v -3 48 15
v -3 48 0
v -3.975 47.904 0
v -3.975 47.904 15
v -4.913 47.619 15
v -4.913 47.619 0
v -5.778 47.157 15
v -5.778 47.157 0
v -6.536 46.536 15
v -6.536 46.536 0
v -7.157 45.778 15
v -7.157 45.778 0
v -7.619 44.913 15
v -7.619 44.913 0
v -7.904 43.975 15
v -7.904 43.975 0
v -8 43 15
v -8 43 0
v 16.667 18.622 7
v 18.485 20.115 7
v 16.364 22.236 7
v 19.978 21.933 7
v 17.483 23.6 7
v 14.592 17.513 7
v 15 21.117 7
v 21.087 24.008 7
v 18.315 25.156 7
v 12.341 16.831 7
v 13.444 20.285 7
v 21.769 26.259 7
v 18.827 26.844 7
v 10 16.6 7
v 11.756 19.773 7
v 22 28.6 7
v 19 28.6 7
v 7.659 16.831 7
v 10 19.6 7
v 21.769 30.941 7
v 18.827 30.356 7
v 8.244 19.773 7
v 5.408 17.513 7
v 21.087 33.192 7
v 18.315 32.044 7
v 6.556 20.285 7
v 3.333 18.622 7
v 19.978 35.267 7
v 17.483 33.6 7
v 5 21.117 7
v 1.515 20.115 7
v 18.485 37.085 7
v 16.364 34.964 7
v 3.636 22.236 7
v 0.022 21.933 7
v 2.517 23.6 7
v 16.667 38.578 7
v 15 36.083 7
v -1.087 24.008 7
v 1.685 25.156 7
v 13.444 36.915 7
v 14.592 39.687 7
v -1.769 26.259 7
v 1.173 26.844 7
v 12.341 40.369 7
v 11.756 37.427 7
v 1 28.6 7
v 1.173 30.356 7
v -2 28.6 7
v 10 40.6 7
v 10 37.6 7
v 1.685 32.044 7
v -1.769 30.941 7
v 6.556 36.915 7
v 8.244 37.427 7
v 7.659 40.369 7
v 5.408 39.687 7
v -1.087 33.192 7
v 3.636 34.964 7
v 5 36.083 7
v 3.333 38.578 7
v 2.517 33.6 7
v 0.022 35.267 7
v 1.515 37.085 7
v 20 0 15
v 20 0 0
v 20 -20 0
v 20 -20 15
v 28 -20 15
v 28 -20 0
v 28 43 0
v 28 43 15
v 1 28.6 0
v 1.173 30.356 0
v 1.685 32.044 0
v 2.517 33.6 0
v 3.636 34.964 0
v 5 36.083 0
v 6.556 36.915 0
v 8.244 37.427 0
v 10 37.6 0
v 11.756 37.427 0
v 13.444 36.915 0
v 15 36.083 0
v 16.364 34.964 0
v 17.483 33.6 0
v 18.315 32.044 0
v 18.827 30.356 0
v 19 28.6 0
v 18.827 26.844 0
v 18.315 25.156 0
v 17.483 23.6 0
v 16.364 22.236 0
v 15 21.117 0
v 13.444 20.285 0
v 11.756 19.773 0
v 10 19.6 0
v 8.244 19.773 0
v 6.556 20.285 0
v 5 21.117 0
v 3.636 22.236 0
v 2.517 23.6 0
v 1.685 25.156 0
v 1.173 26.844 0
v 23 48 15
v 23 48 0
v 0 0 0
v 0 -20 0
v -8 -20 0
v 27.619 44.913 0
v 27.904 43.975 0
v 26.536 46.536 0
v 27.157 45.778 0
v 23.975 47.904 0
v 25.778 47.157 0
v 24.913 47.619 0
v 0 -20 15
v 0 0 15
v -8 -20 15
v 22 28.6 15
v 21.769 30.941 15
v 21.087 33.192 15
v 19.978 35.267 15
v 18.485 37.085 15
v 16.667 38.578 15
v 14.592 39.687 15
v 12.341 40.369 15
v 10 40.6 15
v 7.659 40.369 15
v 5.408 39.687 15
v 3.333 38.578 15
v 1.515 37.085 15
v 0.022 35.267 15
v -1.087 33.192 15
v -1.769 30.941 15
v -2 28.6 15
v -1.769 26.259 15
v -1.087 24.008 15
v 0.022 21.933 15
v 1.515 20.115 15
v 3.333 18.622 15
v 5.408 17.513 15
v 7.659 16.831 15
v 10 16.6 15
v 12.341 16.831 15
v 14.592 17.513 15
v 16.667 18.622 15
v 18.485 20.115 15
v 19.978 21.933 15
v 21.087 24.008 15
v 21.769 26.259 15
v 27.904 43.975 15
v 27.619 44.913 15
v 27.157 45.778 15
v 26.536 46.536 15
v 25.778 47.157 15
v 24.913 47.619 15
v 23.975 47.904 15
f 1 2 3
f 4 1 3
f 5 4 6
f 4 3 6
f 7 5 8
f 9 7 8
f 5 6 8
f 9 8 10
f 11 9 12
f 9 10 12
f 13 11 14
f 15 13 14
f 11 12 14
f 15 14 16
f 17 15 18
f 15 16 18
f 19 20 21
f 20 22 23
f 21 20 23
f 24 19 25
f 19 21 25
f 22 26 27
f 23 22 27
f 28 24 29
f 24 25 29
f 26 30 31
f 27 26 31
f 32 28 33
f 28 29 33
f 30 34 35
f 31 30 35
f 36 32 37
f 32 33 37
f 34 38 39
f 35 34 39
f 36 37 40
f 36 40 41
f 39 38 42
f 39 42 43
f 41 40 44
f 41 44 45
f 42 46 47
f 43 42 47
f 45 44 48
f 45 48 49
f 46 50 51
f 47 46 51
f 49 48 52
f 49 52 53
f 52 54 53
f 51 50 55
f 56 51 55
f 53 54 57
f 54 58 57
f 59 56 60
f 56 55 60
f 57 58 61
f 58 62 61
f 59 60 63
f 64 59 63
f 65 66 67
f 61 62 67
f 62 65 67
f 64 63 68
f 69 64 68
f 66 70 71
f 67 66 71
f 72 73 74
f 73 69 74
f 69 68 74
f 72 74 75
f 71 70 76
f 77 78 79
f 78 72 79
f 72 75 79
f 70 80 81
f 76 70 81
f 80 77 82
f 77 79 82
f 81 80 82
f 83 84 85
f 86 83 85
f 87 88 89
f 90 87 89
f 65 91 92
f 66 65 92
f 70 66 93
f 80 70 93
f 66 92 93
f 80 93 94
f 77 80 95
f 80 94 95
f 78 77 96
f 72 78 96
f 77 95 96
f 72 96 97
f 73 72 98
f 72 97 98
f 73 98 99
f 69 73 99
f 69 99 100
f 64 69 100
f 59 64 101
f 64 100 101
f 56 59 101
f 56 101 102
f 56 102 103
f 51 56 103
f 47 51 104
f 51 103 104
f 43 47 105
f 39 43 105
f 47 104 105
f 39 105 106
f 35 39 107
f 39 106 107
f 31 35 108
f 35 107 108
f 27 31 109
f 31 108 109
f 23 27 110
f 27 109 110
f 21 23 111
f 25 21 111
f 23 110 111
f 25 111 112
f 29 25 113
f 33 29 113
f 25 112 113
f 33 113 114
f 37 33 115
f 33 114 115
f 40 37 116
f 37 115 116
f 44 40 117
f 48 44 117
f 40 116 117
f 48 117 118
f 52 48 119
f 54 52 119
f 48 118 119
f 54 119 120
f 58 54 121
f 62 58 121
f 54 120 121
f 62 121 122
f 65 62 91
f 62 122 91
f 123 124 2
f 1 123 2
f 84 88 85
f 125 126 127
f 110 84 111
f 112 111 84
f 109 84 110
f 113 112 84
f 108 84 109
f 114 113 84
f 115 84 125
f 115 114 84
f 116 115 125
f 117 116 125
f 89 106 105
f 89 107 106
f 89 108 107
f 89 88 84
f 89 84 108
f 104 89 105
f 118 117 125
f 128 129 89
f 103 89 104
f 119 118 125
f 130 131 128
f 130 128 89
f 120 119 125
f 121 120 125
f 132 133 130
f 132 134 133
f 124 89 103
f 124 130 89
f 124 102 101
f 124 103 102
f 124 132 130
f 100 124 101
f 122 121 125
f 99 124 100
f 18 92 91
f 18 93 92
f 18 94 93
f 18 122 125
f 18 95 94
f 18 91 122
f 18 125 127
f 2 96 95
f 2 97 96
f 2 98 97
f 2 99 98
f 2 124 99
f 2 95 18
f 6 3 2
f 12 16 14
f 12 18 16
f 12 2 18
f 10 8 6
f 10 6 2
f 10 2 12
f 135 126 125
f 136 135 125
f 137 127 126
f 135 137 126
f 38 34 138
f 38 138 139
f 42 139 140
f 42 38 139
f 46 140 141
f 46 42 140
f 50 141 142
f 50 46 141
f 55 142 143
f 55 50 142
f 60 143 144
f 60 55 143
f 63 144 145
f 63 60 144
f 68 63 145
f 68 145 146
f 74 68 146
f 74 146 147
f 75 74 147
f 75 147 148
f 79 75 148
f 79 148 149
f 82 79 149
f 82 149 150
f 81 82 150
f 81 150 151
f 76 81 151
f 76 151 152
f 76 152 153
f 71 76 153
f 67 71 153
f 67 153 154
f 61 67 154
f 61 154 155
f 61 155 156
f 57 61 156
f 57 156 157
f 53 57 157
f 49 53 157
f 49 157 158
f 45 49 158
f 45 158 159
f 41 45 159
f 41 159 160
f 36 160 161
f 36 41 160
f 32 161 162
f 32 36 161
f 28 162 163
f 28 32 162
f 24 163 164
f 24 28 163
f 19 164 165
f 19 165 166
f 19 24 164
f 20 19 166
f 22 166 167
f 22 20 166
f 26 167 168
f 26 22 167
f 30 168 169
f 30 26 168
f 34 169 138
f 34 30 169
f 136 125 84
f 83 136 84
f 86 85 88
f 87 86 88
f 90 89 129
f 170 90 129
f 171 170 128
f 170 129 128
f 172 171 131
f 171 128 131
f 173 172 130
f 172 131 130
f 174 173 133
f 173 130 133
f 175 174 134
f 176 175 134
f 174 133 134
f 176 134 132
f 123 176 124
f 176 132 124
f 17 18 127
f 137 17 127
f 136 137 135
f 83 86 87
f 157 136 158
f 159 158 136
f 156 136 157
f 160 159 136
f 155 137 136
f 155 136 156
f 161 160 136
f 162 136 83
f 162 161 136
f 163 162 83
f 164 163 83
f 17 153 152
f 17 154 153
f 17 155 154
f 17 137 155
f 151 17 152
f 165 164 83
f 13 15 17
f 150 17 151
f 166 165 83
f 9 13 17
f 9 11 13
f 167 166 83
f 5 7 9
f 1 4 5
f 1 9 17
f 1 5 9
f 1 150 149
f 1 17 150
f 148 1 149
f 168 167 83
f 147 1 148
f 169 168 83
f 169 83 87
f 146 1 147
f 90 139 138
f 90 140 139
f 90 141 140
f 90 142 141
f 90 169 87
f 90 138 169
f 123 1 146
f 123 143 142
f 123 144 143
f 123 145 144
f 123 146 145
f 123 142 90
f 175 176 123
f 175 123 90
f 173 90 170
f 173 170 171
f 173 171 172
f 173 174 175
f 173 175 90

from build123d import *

# Parameters (mm, degrees)
CROQUIS1_R              = 12
SALIENTE_EXTRUIR1_DEPTH = 15
CROQUIS3_R              = 12
CROQUIS3_R_2            = 9
SALIENTE_EXTRUIR2_DEPTH = 7


with BuildPart() as part:
    # Croquis1 → Saliente-Extruir1 (new body)
    with BuildSketch(Plane.XY):
        with BuildLine():
            Line((0, -20), (0, 0))
            Line((0, 0), (20, 0))
            Line((20, 0), (20, -20))
            Line((20, -20), (28, -20))
            Line((28, -20), (28, 43))
            ThreePointArc((28, 43), (26.535533906, 46.535533906), (23, 48))
            Line((23, 48), (-3, 48))
            ThreePointArc((-3, 48), (-6.535533906, 46.535533906), (-8, 43))
            Line((-8, 43), (-8, -20))
            Line((-8, -20), (0, -20))
        make_face()
        with Locations((10, 28.6)):
            Circle(CROQUIS1_R, mode=Mode.SUBTRACT)
    extrude(amount=SALIENTE_EXTRUIR1_DEPTH)

    # Croquis3 → Saliente-Extruir2 (add)
    with BuildSketch(Plane(origin=(0, 0, 0), x_dir=(-1, 0, 0), z_dir=(0, 0, -1))):
        with Locations((-10, 28.6)):
            Circle(CROQUIS3_R)
        with Locations((-10, 28.6)):
            Circle(CROQUIS3_R_2, mode=Mode.SUBTRACT)
    extrude(amount=-SALIENTE_EXTRUIR2_DEPTH)


solid = part.part
